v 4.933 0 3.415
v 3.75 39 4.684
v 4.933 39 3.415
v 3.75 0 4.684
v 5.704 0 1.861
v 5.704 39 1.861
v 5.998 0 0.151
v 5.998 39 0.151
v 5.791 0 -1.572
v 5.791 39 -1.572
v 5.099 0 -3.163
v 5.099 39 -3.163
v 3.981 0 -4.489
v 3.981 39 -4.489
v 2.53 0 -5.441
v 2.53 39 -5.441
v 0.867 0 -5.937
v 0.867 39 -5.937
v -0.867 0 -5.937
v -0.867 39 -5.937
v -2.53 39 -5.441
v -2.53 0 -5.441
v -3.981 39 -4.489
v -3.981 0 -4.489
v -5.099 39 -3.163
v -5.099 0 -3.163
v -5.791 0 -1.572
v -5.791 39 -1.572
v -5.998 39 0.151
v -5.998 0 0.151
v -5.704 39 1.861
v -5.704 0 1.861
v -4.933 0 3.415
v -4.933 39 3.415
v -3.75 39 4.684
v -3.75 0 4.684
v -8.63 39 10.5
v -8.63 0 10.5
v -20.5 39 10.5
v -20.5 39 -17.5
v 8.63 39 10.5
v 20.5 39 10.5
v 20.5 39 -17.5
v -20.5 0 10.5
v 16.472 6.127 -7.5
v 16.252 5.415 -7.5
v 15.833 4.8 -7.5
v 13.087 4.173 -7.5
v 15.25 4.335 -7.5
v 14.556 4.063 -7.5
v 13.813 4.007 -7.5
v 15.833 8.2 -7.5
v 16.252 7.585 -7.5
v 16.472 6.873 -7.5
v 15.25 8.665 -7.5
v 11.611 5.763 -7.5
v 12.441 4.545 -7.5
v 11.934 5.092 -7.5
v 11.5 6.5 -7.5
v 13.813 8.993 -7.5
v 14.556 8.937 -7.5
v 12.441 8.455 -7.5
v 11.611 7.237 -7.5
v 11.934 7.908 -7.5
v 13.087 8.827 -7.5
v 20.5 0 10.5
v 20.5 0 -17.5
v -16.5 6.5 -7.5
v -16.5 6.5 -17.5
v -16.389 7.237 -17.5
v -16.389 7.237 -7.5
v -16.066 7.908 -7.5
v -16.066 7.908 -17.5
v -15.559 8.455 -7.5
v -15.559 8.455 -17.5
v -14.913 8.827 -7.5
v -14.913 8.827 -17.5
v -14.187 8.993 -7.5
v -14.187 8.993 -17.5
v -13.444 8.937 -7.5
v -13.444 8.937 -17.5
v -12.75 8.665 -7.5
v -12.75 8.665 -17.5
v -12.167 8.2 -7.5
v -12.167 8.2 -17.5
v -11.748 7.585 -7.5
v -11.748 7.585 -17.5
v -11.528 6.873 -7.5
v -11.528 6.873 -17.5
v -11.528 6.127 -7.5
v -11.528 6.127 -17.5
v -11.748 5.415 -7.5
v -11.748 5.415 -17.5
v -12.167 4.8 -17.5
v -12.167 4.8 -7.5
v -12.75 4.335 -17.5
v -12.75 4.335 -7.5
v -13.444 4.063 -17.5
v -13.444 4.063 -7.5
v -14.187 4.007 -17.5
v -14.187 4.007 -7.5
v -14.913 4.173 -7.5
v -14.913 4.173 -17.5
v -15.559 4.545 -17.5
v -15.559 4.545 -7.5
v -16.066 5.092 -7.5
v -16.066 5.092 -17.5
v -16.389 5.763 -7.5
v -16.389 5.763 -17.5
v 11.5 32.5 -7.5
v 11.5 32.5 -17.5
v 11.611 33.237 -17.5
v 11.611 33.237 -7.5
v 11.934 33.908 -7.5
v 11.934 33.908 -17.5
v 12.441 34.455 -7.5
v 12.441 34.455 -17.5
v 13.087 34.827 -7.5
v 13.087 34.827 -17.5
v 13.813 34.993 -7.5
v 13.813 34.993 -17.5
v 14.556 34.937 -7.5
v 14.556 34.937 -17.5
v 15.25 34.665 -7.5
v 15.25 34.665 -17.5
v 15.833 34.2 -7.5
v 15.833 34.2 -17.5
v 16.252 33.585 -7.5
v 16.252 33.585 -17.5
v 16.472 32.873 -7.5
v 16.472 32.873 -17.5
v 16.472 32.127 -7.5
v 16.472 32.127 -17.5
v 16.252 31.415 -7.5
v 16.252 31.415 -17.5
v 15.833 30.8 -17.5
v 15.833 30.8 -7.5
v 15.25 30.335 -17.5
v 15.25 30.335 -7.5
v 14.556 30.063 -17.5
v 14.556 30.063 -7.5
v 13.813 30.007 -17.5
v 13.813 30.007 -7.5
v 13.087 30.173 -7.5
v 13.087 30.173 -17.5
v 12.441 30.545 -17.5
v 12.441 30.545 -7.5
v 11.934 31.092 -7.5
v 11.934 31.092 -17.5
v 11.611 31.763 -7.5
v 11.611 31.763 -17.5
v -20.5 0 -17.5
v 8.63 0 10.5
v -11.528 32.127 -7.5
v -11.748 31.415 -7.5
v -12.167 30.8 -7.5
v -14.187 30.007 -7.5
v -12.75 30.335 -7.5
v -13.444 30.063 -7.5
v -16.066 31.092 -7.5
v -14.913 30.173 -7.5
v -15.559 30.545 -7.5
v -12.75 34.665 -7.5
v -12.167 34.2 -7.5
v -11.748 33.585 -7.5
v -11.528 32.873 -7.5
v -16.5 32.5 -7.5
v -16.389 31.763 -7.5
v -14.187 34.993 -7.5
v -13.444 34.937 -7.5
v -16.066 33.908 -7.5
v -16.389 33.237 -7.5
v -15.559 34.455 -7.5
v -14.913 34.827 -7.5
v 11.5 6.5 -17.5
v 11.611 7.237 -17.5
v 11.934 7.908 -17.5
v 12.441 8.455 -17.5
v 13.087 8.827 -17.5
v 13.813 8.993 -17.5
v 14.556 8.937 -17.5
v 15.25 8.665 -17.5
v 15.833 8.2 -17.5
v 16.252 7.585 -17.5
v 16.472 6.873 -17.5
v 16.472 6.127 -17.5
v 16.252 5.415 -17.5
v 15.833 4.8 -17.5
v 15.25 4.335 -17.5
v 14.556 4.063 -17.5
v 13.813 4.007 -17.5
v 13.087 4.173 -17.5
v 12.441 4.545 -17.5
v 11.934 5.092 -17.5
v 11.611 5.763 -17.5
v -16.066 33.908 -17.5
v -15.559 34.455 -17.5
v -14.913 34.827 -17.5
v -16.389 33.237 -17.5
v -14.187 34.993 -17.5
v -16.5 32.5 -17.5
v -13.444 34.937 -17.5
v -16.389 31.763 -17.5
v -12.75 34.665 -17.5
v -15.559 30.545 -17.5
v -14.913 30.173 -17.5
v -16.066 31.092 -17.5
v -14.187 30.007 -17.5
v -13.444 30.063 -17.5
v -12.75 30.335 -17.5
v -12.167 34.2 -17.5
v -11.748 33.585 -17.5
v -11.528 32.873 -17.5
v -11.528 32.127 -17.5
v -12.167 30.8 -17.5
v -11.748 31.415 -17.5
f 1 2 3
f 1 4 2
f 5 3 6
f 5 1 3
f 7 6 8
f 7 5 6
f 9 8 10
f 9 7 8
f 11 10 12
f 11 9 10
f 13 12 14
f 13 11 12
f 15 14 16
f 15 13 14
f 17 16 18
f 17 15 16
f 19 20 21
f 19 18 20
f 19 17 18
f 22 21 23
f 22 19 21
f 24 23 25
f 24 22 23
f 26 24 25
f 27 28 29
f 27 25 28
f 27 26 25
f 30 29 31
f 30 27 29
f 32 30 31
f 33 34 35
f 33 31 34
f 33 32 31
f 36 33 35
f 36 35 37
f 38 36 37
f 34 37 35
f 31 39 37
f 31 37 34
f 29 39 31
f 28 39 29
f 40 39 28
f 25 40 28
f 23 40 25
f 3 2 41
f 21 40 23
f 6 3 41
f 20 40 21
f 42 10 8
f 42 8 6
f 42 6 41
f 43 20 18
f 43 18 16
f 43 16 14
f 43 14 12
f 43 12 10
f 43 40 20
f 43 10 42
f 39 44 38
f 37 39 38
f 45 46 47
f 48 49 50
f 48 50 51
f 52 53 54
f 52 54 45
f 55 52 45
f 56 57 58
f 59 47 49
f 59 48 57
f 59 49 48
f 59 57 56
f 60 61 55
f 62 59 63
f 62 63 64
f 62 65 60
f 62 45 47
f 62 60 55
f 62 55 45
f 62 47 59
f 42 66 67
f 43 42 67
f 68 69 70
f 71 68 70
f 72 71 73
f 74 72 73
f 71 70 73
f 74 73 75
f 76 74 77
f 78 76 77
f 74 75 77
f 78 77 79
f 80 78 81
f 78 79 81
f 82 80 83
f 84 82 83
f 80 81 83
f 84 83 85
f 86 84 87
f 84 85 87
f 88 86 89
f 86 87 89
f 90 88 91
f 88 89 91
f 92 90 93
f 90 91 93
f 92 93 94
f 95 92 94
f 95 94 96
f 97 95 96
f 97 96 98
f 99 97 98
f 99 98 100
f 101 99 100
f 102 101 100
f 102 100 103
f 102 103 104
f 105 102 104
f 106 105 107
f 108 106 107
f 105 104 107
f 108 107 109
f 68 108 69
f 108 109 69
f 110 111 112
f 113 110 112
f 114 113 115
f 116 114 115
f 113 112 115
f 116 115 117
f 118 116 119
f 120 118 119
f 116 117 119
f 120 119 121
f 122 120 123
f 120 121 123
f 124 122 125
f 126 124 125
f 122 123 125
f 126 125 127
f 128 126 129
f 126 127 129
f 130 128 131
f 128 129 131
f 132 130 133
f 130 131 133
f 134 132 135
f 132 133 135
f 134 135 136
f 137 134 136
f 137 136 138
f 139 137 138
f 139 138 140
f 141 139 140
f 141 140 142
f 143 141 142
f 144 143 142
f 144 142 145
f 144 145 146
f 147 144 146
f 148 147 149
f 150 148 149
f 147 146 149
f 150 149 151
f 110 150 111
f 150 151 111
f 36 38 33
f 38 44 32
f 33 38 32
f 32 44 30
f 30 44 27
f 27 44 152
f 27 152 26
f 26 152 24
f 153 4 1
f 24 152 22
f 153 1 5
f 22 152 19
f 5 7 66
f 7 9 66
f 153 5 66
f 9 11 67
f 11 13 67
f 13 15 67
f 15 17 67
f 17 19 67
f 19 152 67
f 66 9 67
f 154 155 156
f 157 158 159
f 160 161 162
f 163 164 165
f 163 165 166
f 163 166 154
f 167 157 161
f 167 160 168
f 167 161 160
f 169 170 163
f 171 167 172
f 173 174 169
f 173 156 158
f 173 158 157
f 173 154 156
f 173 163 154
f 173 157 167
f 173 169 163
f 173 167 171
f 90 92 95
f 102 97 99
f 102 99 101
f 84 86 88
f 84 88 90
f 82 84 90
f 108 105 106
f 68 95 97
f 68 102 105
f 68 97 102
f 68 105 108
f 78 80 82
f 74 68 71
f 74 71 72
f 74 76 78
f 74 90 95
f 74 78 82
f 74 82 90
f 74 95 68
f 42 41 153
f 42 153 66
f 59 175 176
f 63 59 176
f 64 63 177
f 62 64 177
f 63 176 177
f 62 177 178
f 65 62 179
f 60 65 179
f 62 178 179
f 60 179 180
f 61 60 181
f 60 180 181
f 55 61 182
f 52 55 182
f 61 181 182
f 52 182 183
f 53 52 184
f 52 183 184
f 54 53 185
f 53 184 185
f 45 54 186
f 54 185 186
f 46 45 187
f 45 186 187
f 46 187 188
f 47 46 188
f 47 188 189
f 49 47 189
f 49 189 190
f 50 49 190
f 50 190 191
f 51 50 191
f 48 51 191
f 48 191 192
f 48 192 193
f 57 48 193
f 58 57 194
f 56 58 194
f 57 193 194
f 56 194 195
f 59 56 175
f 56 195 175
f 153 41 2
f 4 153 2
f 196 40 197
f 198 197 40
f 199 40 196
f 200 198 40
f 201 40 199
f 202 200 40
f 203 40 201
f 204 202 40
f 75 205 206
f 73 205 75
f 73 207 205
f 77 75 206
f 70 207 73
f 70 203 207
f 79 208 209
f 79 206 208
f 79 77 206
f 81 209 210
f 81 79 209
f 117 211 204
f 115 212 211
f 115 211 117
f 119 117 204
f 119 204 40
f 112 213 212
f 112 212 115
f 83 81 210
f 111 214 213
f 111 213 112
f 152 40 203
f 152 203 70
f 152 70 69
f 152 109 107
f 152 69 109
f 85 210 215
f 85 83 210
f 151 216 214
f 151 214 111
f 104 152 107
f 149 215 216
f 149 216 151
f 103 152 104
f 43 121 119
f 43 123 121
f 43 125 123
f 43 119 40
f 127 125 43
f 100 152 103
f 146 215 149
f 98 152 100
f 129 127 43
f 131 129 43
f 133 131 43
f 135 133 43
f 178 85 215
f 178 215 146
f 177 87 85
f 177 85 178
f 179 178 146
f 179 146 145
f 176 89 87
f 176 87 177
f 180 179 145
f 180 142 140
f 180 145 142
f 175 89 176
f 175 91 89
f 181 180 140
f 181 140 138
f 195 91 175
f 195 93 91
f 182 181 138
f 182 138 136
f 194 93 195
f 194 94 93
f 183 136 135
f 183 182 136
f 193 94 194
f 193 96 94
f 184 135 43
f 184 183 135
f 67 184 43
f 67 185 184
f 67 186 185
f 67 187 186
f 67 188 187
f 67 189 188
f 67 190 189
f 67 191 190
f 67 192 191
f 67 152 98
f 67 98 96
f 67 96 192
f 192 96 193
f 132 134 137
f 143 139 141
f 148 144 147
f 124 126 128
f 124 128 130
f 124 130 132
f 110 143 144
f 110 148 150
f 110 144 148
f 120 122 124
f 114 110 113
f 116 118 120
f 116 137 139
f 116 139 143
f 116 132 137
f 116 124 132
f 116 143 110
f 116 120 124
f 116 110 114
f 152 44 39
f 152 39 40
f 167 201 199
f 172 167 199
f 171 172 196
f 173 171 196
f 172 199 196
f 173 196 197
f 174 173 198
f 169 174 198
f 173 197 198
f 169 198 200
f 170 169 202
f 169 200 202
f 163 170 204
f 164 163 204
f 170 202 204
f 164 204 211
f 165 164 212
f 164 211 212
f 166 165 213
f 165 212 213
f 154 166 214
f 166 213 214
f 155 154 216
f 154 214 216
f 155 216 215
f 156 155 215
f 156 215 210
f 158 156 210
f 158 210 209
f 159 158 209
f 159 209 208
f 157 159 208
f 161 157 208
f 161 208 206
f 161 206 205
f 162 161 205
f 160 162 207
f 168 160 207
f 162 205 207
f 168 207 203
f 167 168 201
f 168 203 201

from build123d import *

# Parameters (mm, degrees)
SKETCH1_W               = 41
SKETCH1_H               = 28
SKETCH1_R               = 6
BOSS_EXTRUDE1_DEPTH     = 39
CUT_EXTRUDE1_DEPTH      = 1
CUT_EXTRUDE1_DEPTH_BACK = 40
SKETCH3_R               = 2.5
CUT_EXTRUDE2_DEPTH      = 10


with BuildPart() as part:
    # Sketch1 → Boss-Extrude1 (new body)
    with BuildSketch(Plane(origin=(0, 0, 0), x_dir=(1, 0, 0), z_dir=(0, 1, 0))):
        with Locations((0, 3.5)):
            Rectangle(SKETCH1_W, SKETCH1_H)
        Circle(SKETCH1_R, mode=Mode.SUBTRACT)
    extrude(amount=BOSS_EXTRUDE1_DEPTH)

    # Sketch2 → Cut-Extrude1 (cut, two sides)
    with BuildSketch(Plane(origin=(0, 39, 0), x_dir=(1, 0, 0), z_dir=(0, 1, 0))) as cut_extrude1_sk:
        with BuildLine():
            ThreePointArc((3.75, -4.683748499), (0, -6), (-3.75, -4.683748499))
            Line((-3.75, -4.683748499), (-8.630414489, -10.5))
            Line((-8.630414489, -10.5), (8.630414489, -10.5))
            Line((8.630414489, -10.5), (3.75, -4.683748499))
        make_face()
    extrude(amount=CUT_EXTRUDE1_DEPTH, mode=Mode.SUBTRACT)
    extrude(cut_extrude1_sk.sketch, amount=-CUT_EXTRUDE1_DEPTH_BACK, mode=Mode.SUBTRACT)

    # Sketch3 → Cut-Extrude2 (cut)
    with BuildSketch(Plane(origin=(0, 0, -17.5), x_dir=(-1, 0, 0), z_dir=(0, 0, -1))):
        with Locations((14, 32.5)):
            Circle(SKETCH3_R)
        with Locations((-14, 6.5)):
            Circle(SKETCH3_R)
        with Locations((-14, 32.5)):
            Circle(SKETCH3_R)
        with Locations((14, 6.5)):
            Circle(SKETCH3_R)
    extrude(amount=-CUT_EXTRUDE2_DEPTH, mode=Mode.SUBTRACT)


solid = part.part
